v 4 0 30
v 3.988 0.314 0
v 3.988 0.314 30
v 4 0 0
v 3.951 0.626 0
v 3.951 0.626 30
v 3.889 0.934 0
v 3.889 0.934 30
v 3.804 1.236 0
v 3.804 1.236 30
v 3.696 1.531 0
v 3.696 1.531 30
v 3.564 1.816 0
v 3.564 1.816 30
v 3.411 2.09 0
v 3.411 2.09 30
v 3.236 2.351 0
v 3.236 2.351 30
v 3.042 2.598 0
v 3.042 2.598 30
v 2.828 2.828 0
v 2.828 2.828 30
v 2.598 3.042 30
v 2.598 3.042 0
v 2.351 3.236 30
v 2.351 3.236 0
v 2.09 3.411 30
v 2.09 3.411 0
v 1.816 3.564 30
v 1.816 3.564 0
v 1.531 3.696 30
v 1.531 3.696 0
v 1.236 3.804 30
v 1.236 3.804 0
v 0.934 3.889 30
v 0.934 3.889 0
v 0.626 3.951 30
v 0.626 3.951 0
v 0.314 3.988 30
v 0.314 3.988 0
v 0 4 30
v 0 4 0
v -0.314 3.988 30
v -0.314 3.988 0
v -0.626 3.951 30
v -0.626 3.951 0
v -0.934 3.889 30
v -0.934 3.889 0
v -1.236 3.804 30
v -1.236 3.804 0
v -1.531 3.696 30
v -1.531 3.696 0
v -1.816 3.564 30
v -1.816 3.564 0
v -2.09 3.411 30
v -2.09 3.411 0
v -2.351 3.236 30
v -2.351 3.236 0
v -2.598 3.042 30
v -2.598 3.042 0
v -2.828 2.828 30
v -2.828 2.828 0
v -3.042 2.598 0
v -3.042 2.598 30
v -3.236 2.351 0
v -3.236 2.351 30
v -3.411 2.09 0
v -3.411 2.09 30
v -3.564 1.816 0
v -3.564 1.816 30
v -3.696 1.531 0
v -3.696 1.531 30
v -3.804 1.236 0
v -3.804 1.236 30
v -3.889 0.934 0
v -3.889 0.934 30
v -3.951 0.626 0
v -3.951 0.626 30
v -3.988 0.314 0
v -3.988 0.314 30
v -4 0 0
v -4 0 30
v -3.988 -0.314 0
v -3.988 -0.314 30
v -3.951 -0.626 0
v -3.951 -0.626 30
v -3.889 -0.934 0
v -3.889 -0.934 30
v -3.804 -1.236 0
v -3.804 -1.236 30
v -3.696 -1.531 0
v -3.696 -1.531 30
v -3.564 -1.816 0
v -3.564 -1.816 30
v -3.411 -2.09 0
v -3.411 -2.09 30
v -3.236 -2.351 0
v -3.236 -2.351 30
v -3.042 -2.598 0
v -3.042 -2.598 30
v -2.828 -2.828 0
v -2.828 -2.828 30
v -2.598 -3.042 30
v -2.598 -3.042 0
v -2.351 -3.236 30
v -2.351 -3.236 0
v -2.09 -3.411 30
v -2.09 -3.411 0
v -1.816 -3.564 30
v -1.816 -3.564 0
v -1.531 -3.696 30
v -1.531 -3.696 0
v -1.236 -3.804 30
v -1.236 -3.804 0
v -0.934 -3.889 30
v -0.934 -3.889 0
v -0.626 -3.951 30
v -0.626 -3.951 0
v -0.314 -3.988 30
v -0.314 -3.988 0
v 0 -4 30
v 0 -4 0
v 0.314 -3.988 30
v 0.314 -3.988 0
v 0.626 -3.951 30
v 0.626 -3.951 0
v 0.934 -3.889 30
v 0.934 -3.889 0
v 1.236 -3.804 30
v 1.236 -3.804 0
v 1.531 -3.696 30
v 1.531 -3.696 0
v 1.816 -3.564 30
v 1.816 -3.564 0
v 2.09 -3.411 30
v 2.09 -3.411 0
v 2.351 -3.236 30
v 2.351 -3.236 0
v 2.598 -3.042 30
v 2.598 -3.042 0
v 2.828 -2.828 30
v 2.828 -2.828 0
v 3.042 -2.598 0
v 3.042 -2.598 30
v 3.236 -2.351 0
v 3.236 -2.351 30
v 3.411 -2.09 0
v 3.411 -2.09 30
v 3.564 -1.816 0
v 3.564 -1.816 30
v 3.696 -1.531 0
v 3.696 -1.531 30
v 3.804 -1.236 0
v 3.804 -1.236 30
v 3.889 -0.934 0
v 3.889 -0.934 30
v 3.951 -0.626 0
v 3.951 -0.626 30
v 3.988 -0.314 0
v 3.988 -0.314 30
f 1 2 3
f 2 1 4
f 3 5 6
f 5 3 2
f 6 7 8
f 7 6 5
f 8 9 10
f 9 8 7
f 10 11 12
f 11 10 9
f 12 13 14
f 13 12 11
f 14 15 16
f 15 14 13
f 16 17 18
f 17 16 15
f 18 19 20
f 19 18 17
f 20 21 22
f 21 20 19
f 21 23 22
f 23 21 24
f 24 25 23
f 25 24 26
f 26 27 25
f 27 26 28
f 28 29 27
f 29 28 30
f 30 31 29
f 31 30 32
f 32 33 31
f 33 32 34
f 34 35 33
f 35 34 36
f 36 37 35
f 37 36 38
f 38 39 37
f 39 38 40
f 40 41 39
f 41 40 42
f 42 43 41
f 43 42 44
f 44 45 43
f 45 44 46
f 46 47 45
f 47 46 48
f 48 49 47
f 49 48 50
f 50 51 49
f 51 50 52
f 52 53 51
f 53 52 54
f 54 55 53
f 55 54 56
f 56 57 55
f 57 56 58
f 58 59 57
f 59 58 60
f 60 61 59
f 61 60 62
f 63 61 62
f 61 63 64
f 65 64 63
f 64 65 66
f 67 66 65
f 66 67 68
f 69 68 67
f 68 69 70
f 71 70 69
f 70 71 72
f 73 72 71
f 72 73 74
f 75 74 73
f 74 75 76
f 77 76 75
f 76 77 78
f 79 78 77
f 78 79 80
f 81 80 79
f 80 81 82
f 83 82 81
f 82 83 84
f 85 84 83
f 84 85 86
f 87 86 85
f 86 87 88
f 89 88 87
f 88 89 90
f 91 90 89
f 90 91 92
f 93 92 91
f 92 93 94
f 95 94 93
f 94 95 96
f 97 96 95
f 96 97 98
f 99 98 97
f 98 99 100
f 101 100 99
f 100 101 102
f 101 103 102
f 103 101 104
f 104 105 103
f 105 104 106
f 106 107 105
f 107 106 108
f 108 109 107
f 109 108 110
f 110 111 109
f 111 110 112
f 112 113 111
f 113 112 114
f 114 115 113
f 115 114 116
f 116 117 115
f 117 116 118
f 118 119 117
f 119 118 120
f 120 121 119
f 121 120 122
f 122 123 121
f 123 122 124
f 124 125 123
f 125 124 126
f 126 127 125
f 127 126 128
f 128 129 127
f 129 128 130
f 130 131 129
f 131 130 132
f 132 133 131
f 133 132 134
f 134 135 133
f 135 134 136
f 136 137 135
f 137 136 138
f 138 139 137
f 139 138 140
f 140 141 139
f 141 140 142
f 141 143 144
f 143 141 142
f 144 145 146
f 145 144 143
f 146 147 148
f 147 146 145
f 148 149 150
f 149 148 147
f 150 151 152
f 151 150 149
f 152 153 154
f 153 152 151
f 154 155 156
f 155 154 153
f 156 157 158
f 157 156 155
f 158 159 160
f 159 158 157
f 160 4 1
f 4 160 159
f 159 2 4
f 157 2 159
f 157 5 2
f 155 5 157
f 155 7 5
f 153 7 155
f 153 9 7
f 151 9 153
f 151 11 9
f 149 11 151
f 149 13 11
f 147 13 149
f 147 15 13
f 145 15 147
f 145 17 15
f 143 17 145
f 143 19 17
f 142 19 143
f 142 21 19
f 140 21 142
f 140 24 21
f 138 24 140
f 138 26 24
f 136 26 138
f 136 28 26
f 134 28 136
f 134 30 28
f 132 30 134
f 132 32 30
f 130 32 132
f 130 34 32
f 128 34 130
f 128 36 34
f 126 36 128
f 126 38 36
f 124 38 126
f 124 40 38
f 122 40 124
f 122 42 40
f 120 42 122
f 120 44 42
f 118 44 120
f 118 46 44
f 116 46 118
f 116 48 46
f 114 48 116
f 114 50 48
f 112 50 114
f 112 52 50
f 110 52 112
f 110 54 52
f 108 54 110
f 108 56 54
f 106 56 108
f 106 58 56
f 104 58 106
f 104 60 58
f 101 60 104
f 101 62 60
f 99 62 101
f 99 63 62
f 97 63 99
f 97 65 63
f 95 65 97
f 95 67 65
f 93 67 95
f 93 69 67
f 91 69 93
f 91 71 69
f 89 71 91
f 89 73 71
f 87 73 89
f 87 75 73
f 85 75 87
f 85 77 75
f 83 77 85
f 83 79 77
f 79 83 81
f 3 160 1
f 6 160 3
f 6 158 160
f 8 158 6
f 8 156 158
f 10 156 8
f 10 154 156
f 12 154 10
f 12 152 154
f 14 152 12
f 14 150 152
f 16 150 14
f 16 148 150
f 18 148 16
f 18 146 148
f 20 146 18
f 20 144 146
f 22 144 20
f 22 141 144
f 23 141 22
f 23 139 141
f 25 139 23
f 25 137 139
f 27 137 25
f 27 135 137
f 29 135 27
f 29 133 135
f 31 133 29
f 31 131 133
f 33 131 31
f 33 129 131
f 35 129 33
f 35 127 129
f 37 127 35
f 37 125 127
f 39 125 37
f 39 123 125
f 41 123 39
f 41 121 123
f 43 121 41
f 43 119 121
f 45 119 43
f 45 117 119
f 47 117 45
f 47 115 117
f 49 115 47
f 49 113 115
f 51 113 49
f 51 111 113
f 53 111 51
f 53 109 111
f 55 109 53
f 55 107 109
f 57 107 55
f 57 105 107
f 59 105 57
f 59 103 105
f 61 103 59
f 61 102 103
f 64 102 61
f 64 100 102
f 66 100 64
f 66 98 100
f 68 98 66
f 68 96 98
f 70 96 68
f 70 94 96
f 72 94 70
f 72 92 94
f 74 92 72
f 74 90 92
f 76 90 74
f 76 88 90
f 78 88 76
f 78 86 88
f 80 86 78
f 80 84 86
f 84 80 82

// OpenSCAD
$fn = 80;

diameter = 8; //8mm
height = 30;  //30mm
module dowel(d=diameter,h=height)
{
    cylinder(d=diameter,h=height);
}
dowel();
